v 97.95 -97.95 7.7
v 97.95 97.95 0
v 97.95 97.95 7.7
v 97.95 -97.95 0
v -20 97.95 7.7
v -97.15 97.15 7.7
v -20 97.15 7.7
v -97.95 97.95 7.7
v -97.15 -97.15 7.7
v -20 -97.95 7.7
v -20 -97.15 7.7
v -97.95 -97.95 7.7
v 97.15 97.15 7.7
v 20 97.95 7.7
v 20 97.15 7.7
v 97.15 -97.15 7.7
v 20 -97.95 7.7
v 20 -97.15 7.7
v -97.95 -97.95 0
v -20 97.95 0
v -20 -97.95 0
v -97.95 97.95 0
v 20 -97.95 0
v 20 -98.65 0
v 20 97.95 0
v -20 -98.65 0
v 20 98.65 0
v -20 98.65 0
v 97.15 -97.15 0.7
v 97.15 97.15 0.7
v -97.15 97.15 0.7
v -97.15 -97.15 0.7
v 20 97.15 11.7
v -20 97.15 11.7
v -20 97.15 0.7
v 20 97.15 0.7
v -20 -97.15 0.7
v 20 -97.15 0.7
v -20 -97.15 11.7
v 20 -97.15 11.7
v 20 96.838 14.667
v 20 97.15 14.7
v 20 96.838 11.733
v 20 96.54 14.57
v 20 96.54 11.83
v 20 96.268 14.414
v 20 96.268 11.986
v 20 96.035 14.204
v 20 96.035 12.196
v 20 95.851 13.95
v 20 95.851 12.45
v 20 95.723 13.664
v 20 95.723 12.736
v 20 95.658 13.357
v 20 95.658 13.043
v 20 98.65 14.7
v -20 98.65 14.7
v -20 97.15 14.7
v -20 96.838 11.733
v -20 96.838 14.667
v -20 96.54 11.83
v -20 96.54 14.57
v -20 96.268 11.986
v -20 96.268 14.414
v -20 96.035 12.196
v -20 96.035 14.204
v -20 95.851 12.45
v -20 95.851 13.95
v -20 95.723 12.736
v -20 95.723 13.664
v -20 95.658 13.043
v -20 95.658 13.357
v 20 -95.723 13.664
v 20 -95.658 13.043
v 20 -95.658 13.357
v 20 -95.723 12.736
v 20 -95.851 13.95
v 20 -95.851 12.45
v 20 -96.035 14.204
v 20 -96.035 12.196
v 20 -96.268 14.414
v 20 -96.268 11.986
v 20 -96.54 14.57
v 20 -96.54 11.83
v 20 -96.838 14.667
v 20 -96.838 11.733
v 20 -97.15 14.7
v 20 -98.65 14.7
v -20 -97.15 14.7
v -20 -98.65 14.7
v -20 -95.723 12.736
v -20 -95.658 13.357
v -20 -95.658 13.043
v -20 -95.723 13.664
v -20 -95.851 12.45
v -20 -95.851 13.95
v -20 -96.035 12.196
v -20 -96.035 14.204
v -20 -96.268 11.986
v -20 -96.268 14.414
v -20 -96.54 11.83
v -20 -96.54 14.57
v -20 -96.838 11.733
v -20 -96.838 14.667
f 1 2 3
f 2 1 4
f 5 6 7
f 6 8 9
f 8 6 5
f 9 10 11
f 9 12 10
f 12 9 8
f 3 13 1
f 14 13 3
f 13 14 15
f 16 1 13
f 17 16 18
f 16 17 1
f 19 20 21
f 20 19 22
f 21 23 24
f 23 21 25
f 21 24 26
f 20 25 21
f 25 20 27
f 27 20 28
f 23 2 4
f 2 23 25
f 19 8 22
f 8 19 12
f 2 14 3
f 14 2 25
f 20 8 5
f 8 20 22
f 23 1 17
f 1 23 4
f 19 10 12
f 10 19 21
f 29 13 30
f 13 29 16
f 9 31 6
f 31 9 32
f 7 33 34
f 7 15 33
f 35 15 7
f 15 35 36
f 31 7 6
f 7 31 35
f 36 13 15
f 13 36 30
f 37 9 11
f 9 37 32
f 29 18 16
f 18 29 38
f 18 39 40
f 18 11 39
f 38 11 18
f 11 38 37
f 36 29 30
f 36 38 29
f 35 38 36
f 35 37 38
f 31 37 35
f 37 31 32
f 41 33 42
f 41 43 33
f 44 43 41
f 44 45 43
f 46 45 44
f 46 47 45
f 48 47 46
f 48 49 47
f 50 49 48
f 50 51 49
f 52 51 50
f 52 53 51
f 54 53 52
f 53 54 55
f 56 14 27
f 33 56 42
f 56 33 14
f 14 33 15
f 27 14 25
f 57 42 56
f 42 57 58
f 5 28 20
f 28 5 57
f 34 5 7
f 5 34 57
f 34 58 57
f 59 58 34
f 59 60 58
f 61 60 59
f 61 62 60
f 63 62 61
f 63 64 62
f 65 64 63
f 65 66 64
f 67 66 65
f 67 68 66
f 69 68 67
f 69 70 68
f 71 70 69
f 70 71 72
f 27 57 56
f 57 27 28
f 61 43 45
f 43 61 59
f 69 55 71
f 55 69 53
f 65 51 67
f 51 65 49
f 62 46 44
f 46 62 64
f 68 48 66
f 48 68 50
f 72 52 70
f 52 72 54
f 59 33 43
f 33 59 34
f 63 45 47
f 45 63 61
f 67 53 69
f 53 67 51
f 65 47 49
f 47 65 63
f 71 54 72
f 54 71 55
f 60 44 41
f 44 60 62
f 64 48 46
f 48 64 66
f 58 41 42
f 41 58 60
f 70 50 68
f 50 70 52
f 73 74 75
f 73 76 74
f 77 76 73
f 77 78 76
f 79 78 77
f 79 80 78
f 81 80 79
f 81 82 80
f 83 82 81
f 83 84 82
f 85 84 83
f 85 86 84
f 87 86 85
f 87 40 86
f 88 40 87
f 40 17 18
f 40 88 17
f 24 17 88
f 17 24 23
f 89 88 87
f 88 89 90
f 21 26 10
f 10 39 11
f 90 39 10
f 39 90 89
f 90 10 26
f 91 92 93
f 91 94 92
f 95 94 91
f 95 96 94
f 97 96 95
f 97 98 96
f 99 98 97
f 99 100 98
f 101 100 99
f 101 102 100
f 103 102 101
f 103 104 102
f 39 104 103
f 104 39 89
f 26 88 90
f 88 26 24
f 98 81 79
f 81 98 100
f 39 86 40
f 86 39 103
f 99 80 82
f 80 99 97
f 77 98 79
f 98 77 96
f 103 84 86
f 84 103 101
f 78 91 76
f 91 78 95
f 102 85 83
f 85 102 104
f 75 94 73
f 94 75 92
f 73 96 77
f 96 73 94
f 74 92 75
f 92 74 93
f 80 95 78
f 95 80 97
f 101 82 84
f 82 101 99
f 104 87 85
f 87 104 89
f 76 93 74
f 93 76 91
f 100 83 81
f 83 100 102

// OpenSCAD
wall = 0.8;
backplate = 0.9;
panel = 192.1;
panel_z = 13.8;
gap = 0.3;
cover_wall = 0.8;
cover_backplate = 0.7;
cover_border_height = 7;
touchin_area_height = 0;
eps=0.02;

arm_len = 40;
arm_snap_r = 1.5;
arm_height = panel_z+backplate;
arm_thick = 1.5;

hole_x = 88;
hole_y = 50;

$fn=30;


    
!union() {
    // backplate    
    translate([0,0,cover_backplate/2])
        cube([panel+2*(wall+gap+cover_wall),panel+2*(wall+gap+cover_wall),cover_backplate], center=true);
    
    // frame
    difference() {
        translate([0,0,(cover_backplate+cover_border_height)/2])
            cube([panel+2*(wall+gap+cover_wall),panel+2*(wall+gap+cover_wall),cover_backplate+cover_border_height], center=true);
        
        translate([0,0,(cover_backplate+cover_border_height+eps)/2])
            cube([panel+2*(wall+gap),panel+2*(wall+gap),cover_backplate+cover_border_height], center=true);
    }
    
    // touching area
    
    difference() {
        translate([0,0,(cover_backplate+touchin_area_height)/2])
            cube([panel+2*(wall+gap+eps),panel+2*(wall+gap+eps),cover_backplate+touchin_area_height], center=true);
        
        translate([0,0,(cover_backplate+touchin_area_height+eps)/2])
            cube([panel,panel,cover_backplate+touchin_area_height], center=true);
    }
    
    
    // arms
    union() {
        translate([0,(panel+arm_thick)/2+wall+gap,arm_height/2])
            cube([arm_len, arm_thick, arm_height], center=true);
    
        translate([0,(panel+2*arm_thick-0.8)/2,-arm_snap_r+arm_height])
            rotate([0,90,0])
                cylinder(arm_len, arm_snap_r, arm_snap_r, center=true);
    }


    union() {
        translate([0,-((panel+arm_thick)/2+wall+gap),arm_height/2])
            cube([arm_len, arm_thick, arm_height], center=true);
    
        translate([0,-(panel+2*arm_thick-0.8)/2,-arm_snap_r+arm_height])
            rotate([0,90,0])
                cylinder(arm_len, arm_snap_r, arm_snap_r, center=true);
    }

}
    

difference() {
    translate([0,0,(panel_z+backplate)/2])
        cube([panel+2*wall, panel+2*wall, panel_z+backplate], center=true);
    
   translate([0,0,panel_z/2+backplate+eps])
        cube([panel,panel, panel_z], center=true);
    
    hole(hole_x,hole_y,2);
    hole(-hole_x,hole_y,2);
    hole(hole_x,-hole_y,2);
    hole(-hole_x,-hole_y,2);
    
    hole(hole_y,hole_x,2);
    hole(-hole_y,hole_x,2);
    hole(hole_y,-hole_x,2);
    hole(-hole_y,-hole_x,2);
    
    // USB C
    translate([-(panel/2-5-4),panel/2,20/2+backplate-0.8])
        cube([12, 30, 20], center=true);
    
    // micro USB
    translate([0,panel/2,20/2+backplate-0.8])
        cube([8, 20, 20], center=true);
        
    // Bootsel
    hole(4,panel/2-14.5-3,3);

    // Button
    hole(panel/2-59,panel/2-8,7);
    hole(-(panel/2-59),panel/2-8,7);
    
    // air
    for ( x = [-60:20:60]) {
        for ( y = [-60:20:60]) {
            hole(x,y,7);
        }
    }
    
    // hang
    hole(0,-panel/2+15,2);
}


module hole(x,y,r) {
    translate([x,y,0])
        cylinder(10, r, r, center=true);
    
}
